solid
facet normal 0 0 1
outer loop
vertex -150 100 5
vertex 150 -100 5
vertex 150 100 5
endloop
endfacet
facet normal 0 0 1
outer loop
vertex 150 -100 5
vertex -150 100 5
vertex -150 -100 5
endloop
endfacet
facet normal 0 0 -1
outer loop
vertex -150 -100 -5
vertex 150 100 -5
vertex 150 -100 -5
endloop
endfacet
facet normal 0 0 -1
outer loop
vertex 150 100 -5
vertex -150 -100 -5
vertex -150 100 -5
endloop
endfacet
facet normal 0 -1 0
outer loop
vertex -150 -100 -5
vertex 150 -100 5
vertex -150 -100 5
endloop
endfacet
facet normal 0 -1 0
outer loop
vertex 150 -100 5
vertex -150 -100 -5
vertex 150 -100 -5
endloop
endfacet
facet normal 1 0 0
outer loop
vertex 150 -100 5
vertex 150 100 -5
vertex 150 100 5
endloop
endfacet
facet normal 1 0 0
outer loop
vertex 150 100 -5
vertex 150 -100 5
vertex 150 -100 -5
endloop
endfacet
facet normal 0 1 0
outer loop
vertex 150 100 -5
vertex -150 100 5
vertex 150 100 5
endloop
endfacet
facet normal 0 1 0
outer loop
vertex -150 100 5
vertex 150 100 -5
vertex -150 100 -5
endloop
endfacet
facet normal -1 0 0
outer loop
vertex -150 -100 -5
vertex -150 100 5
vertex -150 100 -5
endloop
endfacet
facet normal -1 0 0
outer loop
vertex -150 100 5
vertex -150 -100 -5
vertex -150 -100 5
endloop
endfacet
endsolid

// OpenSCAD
// Parameters
plate_length = 300; //[150:600:1]
plate_width = 200; //[100:400:1]
plate_thickness = 10; //[5:20:1]
chamfer_size = 2; //[1:6:1]
edge_fillet_radius = 1; //[0.5:4:0.5]
label_depth = 0.3; //[0.1:1:0.1]

// Main tooling plate body
module tooling_plate_body() {
  color("Silver")
  cube([plate_length, plate_width, plate_thickness], center=true);
}

// Final output
tooling_plate_body();
